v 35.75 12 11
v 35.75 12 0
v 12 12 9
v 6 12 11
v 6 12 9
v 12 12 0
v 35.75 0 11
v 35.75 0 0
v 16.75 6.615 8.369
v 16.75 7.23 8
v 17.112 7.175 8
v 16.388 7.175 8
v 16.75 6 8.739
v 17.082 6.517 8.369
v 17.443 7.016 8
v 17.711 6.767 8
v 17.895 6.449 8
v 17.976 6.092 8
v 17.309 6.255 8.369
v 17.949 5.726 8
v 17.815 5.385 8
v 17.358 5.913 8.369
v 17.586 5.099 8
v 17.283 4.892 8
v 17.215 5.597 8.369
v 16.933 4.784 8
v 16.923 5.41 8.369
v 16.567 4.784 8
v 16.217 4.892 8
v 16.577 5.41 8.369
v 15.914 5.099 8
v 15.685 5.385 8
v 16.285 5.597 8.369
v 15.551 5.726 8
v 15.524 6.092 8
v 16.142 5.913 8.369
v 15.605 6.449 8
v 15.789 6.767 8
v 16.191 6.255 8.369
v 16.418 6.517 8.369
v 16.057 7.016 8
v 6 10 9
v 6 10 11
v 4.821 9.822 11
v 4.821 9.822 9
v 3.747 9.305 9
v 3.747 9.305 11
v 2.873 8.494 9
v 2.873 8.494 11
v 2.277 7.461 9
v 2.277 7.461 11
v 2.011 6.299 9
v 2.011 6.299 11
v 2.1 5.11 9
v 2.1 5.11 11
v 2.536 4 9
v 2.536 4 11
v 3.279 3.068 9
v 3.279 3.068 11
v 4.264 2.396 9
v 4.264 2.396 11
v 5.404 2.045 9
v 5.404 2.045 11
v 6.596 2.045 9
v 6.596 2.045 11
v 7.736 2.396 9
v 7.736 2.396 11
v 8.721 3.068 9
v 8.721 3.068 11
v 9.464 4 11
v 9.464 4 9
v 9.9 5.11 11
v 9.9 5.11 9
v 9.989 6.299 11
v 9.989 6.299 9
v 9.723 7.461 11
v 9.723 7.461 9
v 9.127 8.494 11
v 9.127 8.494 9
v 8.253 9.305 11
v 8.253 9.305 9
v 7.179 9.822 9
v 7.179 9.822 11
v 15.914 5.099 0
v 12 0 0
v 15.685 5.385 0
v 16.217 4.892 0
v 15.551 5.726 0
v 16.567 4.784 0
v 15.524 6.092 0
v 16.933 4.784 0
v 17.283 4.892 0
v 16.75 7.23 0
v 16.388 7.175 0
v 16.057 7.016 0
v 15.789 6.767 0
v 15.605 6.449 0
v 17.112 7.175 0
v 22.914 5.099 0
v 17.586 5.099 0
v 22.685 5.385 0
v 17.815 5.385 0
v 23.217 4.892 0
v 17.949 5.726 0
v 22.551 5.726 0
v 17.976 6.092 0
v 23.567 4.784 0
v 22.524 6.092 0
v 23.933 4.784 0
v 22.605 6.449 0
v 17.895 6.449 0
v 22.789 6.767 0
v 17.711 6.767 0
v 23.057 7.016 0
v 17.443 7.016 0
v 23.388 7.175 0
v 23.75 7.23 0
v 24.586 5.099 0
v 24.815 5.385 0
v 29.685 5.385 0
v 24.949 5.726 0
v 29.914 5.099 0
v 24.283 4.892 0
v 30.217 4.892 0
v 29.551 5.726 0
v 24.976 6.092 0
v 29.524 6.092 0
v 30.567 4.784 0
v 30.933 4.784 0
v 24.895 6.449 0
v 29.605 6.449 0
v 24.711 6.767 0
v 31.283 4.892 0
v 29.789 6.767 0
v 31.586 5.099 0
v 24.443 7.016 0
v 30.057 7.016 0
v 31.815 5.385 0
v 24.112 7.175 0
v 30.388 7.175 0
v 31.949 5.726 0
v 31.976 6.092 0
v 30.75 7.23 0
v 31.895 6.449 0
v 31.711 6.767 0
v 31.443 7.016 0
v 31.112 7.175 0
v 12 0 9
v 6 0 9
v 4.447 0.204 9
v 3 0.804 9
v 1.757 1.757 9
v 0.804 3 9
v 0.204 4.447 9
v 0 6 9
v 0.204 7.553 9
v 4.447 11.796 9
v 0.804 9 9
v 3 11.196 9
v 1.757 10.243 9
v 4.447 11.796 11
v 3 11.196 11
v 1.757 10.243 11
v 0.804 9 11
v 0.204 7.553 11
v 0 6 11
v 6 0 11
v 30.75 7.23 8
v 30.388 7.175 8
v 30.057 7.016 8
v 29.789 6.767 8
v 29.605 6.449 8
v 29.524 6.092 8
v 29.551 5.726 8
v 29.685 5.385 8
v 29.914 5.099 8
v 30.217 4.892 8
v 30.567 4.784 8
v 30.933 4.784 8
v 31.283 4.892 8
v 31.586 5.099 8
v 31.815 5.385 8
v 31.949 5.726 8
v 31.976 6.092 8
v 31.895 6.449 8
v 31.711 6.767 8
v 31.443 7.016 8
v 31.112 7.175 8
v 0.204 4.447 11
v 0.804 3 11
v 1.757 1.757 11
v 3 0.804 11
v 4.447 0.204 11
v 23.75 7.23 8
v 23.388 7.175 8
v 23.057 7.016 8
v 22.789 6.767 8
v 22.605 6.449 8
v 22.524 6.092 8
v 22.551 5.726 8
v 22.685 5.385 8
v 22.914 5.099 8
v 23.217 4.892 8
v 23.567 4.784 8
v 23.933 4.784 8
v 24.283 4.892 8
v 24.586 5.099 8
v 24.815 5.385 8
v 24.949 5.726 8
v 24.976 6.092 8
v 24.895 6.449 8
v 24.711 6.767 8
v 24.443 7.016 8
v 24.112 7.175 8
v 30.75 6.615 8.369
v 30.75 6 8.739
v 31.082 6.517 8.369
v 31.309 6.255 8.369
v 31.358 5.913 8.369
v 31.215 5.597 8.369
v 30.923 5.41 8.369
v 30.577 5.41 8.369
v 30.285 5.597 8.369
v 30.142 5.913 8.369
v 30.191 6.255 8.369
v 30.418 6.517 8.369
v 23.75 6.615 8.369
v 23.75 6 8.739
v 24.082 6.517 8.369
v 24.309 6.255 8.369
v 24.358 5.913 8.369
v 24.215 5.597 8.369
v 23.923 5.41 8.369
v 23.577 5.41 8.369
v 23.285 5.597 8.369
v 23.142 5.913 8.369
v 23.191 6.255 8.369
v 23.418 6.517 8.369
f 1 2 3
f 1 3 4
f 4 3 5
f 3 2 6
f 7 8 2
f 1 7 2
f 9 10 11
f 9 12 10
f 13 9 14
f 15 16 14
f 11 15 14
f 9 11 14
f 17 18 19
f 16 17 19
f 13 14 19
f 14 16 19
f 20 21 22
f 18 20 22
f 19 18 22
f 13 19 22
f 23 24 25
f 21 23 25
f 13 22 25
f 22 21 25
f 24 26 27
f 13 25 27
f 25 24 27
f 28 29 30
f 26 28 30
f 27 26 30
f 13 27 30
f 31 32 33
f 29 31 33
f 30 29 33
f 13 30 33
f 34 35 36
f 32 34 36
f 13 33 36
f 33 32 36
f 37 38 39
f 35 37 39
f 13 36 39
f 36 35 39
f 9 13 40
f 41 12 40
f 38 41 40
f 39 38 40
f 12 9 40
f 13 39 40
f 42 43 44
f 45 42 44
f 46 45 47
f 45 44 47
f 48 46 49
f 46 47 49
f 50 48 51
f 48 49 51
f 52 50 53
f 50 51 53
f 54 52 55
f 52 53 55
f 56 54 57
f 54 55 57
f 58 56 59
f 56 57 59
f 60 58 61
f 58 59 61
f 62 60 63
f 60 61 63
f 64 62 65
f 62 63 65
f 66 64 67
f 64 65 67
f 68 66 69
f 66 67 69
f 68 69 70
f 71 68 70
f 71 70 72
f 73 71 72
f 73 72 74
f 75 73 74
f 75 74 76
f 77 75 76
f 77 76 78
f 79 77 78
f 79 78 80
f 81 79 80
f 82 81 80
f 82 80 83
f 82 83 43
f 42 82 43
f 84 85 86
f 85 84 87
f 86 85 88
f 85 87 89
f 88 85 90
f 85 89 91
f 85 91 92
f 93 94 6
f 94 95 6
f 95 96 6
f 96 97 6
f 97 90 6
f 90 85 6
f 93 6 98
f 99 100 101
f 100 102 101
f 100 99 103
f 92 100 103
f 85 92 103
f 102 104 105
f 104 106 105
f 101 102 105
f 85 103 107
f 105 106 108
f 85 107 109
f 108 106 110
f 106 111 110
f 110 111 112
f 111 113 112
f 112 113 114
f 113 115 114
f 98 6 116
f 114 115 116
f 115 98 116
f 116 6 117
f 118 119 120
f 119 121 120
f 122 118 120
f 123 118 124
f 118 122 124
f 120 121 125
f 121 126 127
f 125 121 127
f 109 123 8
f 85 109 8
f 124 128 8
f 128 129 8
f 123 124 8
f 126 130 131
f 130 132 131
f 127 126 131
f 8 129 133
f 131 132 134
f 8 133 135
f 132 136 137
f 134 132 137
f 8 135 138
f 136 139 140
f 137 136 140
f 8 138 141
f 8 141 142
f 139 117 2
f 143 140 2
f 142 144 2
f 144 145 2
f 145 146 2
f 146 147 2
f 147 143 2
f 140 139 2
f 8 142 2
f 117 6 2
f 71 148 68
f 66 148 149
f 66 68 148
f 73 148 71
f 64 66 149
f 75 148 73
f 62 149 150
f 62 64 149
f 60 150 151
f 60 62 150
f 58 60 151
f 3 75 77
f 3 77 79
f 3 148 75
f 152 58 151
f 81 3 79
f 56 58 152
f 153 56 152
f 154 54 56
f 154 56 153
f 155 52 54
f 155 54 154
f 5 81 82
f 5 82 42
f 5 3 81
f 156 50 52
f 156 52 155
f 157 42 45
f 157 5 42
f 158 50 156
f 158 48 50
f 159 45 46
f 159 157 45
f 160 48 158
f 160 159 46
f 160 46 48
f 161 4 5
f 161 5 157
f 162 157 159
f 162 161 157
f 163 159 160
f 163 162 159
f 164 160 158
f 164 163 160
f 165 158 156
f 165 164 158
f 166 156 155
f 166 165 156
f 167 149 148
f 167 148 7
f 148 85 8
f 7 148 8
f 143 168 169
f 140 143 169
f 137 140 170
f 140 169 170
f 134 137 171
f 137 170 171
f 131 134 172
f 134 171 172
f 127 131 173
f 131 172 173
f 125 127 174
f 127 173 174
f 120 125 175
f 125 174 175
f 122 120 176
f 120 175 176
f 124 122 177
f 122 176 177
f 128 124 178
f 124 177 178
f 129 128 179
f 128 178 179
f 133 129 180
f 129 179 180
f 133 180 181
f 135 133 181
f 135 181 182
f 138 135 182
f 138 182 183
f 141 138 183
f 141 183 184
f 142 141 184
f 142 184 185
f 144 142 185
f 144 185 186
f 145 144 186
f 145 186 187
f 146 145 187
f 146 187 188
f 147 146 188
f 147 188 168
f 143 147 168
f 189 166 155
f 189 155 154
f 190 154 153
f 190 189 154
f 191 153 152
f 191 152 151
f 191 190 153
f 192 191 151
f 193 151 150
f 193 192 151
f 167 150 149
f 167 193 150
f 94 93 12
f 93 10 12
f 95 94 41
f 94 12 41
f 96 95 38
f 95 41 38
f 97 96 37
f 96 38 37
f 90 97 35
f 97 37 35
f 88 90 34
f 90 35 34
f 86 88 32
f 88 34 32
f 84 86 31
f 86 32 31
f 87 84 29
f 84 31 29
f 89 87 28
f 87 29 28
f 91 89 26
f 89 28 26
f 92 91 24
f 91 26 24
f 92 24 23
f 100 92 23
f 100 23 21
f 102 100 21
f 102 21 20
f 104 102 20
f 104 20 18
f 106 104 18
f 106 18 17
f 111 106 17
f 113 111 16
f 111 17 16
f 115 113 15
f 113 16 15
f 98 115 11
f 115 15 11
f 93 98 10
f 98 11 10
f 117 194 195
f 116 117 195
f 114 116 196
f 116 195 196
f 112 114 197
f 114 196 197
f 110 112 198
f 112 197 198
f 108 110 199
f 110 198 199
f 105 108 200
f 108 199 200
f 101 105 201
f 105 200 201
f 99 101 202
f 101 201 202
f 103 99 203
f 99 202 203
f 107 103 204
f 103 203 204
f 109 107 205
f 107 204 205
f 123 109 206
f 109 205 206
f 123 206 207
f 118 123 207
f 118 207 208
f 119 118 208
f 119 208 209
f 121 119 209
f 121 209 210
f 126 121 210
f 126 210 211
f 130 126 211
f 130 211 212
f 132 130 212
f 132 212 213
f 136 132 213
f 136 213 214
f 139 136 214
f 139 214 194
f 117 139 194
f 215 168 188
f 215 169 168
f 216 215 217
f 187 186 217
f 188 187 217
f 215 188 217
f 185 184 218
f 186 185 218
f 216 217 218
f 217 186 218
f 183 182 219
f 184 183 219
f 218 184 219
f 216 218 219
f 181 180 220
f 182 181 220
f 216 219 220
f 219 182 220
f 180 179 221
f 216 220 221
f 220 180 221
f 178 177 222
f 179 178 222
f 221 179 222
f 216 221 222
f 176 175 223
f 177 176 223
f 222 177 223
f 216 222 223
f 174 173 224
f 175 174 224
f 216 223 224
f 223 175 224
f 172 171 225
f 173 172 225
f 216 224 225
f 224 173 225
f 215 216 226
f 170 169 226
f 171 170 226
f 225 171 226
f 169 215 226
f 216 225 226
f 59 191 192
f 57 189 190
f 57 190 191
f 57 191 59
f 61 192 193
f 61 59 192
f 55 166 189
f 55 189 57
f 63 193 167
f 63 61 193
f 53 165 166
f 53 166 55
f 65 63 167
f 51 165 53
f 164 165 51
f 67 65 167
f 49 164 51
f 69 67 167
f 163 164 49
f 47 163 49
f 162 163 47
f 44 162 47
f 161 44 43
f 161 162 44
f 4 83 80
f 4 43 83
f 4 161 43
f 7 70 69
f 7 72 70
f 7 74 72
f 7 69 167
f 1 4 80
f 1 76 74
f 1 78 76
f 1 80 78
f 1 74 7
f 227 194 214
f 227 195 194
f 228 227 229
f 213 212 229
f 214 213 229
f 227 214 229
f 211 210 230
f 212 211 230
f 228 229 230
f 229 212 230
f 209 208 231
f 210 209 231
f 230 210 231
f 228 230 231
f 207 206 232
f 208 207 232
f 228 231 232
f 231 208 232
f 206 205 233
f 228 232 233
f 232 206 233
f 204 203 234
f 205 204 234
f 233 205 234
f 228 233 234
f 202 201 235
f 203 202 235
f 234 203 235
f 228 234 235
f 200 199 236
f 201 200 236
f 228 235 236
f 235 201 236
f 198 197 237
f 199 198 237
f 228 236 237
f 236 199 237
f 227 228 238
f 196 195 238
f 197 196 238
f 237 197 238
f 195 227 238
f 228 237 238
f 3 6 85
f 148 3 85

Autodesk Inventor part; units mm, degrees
ref_plane "YZ Plane" through (0, 0, 0) normal (1, 0, 0) x (0, 1, 0)
ref_plane "XZ Plane" through (0, 0, 0) normal (0, 1, 0) x (-1, 0, 0)
ref_plane "XY Plane" through (0, 0, 0) normal (0, 0, 1) x (1, 0, 0)
sketch "Sketch1" plane through (0, 0, 0) normal (0, 0, 1) x (1, 0, 0)
  line L0 (0, 0) -> (35.75, 0)
  line L1 (35.75, 0) -> (35.75, 12)
  line L2 (35.75, 12) -> (0, 12)
  line L3 (0, 12) -> (0, 0)
  dimension "d0" = 35.75
  dimension "d1" = 12
extrude "Extrusion1" add sketch "Sketch1" along normal blind 11
sketch "Sketch5" plane through (0, 0, 0) normal (0, 0, -1) x (-1, 0, 0)
  line L0 (0, 12) -> (0, 0) projected
  line L1 (-35.75, 0) -> (-35.75, 12) projected
  line L2 (0, 0) -> (-35.75, 0) projected
  line L3 (-35.75, 12) -> (0, 12) projected
  line L4 (-35.75, 6) -> (0, 6) construction
  line L5 (-30.75, 12) -> (-30.75, 0) construction
  line L6 (-23.75, 12) -> (-23.75, 0) construction
  line L7 (-16.75, 12) -> (-16.75, 0) construction
  point P0 (-30.75, 6)
  point P1 (-23.75, 6)
  point P2 (-16.75, 6)
  dimension "d46" = 6
  dimension "d48" = 5
  dimension "d49" = 7
  dimension "d50" = 7
hole "Hole3" at (30.75, 6, 0) at (23.75, 6, 0) at (16.75, 6, 0) direction (0, 0, 1) diameter 2.459 depth 8 tip angle 118 thread size "M3x0.5" class "6H" standard "ANSI Metric M Profile"
sketch "Sketch6" plane through (0, 0, 0) normal (0, 0, -1) x (-1, 0, 0)
  line L0 (0, 12) -> (0, 0) projected
  line L1 (-35.75, 0) -> (-35.75, 12) projected
  line L2 (0, 6) -> (-35.75, 6) construction
  point P0 (-6, 6)
  dimension "d35" = 6
hole "Hole4" at (6, 6, 0) direction (0, 0, 1) diameter 8 end through all
sketch "Sketch7" plane through (0, 0, 0) normal (0, 0, -1) x (-1, 0, 0)
  circle A0 centre (-6, 6) radius 4 projected
  line L0 (0, 0) -> (-35.75, 0) projected
  line L1 (0, 12) -> (-12, 12)
  line L2 (-12, 12) -> (-12, 0)
  line L3 (-12, 0) -> (0, 0)
  line L4 (0, 0) -> (0, 12)
  dimension "d43" = 12
extrude "Extrusion3" cut sketch "Sketch7" against normal blind 9
fillet "Fillet5" radius 6 2 edges at (0, 12, 10) (0, 0, 10)
properties part number "termination_lv_conductor" material "Copper, Cast"
